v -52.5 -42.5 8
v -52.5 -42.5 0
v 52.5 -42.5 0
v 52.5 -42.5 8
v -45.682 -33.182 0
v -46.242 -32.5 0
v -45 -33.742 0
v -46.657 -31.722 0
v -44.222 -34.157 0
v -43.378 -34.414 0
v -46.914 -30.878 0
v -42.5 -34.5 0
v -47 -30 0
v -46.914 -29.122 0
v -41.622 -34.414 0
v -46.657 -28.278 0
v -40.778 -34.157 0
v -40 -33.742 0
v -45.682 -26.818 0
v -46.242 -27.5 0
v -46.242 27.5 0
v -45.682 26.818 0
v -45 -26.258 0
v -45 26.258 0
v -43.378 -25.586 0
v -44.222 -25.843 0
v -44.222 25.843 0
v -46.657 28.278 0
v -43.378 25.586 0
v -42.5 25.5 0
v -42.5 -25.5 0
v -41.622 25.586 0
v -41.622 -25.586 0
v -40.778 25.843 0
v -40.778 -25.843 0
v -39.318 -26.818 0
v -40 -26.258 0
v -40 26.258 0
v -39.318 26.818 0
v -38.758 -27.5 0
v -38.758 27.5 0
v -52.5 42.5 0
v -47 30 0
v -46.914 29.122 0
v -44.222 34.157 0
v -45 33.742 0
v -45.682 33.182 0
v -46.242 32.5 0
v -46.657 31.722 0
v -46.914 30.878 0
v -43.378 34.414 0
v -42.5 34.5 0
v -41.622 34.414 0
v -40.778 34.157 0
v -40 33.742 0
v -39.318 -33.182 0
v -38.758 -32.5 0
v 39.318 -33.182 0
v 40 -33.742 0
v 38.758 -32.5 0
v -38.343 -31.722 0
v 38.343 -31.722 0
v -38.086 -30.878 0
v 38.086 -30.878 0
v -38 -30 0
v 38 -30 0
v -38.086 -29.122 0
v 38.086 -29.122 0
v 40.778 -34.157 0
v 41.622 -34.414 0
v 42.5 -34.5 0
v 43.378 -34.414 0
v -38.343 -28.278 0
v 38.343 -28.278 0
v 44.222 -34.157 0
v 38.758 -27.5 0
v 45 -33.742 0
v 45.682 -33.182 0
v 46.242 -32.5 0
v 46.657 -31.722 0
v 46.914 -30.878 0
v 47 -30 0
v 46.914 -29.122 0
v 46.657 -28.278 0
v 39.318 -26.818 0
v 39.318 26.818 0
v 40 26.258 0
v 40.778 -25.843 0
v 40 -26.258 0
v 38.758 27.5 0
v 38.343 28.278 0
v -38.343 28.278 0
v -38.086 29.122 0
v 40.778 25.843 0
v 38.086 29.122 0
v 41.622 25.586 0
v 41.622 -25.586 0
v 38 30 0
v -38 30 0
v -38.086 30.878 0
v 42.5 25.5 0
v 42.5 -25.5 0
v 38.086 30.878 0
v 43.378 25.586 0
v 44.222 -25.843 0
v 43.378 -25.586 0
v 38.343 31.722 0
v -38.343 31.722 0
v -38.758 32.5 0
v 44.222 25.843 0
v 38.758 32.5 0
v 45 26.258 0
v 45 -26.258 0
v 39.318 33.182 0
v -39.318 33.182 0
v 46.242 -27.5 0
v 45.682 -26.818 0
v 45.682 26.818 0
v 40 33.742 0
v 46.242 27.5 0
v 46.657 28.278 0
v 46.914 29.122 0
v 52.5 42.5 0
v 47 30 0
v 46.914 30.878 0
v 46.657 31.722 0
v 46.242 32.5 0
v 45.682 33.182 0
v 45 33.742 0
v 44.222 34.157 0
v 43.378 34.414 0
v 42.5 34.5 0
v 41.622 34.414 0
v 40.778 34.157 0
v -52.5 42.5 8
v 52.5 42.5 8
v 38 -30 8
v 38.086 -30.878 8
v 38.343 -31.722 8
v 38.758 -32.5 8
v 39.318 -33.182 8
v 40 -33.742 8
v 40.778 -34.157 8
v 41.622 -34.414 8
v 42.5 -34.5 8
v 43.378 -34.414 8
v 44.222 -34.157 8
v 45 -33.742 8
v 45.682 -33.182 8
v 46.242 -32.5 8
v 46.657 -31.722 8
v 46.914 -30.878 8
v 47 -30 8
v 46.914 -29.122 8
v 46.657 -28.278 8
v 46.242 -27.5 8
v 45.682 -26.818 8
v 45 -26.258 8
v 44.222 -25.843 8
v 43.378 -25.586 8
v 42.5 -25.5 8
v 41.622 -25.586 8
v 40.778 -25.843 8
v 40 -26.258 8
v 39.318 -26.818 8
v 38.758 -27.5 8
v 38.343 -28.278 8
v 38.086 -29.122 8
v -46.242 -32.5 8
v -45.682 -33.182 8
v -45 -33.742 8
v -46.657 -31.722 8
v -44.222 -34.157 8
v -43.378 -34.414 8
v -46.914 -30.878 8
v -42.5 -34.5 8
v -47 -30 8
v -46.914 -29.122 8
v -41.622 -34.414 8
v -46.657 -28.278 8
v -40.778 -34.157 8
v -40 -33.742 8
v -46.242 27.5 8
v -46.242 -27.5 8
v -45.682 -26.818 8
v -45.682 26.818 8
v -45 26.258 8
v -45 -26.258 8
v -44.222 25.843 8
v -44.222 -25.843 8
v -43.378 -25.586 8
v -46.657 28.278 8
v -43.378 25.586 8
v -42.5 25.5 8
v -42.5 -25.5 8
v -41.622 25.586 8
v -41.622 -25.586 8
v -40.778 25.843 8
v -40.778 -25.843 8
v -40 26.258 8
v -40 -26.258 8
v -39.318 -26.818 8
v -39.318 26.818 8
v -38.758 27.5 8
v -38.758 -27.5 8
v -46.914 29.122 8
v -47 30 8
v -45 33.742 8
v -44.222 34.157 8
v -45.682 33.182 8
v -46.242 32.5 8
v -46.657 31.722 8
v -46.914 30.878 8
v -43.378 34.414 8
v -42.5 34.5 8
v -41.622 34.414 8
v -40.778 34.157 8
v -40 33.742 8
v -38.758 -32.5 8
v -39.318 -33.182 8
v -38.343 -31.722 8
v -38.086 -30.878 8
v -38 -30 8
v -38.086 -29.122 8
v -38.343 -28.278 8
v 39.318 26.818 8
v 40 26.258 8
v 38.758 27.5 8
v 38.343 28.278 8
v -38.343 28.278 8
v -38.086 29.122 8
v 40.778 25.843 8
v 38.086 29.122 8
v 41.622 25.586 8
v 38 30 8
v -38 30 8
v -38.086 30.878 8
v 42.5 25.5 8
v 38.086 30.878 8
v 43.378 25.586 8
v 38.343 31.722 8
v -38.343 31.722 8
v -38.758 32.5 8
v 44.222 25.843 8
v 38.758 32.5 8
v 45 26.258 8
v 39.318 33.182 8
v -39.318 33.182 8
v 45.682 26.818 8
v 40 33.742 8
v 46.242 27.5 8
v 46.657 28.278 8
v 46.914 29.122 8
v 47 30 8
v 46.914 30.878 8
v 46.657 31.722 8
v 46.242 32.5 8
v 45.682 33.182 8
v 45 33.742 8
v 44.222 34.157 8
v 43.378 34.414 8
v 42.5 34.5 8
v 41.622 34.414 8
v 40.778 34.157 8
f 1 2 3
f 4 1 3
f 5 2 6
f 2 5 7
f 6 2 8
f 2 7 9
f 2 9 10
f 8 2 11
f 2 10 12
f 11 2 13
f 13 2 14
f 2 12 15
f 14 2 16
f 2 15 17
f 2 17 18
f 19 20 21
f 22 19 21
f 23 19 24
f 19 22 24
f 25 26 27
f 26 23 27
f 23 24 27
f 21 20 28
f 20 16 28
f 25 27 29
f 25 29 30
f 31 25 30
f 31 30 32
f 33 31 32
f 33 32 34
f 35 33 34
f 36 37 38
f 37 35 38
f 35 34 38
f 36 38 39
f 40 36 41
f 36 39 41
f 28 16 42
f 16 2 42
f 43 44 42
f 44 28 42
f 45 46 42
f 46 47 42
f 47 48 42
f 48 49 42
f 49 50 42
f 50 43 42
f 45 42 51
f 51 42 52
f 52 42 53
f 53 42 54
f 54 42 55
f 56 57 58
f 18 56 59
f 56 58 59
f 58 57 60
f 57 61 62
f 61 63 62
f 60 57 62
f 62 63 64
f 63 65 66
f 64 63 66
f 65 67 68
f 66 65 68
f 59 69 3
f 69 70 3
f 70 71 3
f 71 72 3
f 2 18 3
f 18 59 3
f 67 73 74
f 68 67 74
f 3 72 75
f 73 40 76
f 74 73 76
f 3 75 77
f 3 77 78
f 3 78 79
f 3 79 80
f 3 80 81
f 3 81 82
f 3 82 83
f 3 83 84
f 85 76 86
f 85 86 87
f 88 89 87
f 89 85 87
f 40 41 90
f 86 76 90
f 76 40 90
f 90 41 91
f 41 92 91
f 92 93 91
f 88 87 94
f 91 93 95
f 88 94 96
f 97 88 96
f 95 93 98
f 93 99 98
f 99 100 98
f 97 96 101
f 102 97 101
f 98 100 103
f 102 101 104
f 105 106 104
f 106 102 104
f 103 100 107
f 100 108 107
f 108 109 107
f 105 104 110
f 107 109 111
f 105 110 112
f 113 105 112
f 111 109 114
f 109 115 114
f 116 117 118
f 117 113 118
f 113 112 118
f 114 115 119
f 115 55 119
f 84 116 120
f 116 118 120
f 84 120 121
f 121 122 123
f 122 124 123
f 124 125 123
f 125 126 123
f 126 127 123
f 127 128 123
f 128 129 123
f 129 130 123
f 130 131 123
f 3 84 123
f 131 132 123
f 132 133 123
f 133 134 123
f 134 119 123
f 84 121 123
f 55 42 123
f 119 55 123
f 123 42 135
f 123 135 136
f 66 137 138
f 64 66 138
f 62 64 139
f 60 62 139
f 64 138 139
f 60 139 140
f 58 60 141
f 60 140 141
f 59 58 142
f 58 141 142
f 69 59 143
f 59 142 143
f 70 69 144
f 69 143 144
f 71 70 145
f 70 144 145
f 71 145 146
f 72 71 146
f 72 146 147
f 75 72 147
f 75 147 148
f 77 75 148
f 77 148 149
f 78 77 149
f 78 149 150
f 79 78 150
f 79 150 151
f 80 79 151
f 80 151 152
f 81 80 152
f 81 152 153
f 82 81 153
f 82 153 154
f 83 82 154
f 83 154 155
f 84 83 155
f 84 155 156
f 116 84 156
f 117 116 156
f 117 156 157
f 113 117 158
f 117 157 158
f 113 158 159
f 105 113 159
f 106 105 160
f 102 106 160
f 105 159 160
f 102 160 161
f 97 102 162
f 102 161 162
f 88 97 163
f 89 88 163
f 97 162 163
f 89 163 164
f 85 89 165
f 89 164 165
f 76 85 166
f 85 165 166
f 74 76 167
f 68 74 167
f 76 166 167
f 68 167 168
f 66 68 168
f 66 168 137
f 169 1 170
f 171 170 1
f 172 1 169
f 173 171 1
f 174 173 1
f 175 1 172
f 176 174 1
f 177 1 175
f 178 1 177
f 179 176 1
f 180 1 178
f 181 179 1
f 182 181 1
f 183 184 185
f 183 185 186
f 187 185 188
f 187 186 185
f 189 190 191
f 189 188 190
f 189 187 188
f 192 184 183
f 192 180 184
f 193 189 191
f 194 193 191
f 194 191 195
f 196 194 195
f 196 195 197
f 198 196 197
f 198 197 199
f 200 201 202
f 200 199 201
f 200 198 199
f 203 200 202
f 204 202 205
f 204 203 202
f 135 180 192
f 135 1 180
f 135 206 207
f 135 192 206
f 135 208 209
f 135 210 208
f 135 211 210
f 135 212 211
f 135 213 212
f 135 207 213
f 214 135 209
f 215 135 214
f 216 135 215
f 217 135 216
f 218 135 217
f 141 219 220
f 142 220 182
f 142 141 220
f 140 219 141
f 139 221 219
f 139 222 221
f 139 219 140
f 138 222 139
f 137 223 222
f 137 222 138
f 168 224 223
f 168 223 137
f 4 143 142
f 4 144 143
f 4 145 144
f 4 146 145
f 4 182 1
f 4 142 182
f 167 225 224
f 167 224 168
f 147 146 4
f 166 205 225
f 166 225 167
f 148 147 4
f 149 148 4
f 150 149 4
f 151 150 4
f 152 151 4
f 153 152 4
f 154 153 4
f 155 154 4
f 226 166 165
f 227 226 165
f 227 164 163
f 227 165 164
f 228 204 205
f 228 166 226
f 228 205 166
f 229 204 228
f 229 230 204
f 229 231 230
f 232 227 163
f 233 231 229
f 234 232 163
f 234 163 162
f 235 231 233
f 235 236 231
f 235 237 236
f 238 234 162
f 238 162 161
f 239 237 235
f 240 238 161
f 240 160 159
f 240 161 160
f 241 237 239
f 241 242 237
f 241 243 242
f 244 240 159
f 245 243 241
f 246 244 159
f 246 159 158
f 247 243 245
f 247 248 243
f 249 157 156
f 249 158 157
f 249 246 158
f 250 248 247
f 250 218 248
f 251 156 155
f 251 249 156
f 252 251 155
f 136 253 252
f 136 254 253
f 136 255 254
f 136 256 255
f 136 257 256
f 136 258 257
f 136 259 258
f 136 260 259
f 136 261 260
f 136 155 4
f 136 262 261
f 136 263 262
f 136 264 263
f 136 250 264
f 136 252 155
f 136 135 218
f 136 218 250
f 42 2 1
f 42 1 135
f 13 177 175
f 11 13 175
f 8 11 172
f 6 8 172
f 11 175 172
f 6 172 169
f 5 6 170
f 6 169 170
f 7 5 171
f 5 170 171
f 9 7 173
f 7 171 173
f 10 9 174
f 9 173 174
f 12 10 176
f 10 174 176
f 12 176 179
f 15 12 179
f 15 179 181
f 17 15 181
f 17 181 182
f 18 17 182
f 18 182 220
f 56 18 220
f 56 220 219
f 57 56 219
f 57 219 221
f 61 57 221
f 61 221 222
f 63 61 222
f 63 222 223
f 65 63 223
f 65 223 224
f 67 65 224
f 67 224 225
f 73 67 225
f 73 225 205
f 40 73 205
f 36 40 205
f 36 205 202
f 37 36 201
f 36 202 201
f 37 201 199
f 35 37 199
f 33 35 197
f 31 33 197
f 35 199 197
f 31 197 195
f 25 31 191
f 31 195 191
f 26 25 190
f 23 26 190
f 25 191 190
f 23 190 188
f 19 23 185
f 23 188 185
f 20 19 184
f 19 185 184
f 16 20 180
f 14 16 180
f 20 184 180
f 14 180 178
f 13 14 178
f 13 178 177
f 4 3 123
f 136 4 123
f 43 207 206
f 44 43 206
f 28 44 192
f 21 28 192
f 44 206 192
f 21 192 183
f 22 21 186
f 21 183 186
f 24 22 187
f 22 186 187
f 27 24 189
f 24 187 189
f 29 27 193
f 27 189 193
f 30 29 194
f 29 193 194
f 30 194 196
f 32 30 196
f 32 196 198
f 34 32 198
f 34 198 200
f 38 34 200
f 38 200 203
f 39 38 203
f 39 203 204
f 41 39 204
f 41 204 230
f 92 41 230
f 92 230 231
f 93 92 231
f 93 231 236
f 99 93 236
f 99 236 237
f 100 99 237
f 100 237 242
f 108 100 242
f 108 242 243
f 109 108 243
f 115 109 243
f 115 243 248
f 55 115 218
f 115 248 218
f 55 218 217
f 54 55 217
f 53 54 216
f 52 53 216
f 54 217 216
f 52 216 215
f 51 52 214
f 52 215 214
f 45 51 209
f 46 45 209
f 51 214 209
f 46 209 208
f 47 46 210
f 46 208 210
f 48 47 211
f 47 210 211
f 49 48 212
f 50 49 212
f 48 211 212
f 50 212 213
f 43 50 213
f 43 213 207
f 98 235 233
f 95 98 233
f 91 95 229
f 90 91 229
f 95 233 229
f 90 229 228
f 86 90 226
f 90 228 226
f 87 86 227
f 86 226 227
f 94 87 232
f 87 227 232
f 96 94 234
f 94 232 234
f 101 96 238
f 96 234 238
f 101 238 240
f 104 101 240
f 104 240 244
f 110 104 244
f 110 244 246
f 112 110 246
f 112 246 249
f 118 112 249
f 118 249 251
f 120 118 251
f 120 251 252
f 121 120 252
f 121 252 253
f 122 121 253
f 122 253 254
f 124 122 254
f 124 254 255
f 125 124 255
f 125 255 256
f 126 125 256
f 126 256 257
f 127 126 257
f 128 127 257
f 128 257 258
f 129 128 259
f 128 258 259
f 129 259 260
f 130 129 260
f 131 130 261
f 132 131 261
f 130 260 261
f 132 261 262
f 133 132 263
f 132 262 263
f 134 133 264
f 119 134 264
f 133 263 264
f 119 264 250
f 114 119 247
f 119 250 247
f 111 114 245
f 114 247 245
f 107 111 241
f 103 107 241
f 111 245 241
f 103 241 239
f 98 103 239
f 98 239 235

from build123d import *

# Parameters (mm, degrees)
F0_W     = 105
F0_H     = 85
F0_R     = 4
F1_DEPTH = 8
F2_D     = 9
F2_DEPTH = 14
F2_TIP   = 2.7038727856


with BuildPart() as f1:
    # F0 (on Top) → F1 (new body)
    with BuildSketch(Plane.XY):
        Rectangle(F0_W, F0_H)
        with Locations((-42.5, -30)):
            Circle(F0_R, mode=Mode.SUBTRACT)
        with Locations((42.5, -30)):
            Circle(F0_R, mode=Mode.SUBTRACT)
        with Locations((-42.5, 30)):
            Circle(F0_R, mode=Mode.SUBTRACT)
        with Locations((42.5, 30)):
            Circle(F0_R, mode=Mode.SUBTRACT)
        with Locations((-42.5, 30)):
            Circle(F0_R)
        with Locations((42.5, 30)):
            Circle(F0_R)
        with Locations((42.5, -30)):
            Circle(F0_R)
        with Locations((-42.5, -30)):
            Circle(F0_R)
    extrude(amount=F1_DEPTH)

    # F2
    with Locations(Plane(origin=(0, 0, 0), x_dir=(1, 0, 0), z_dir=(0, 0, -1))):
        with Locations((-42.5, -30), (42.5, -30), (42.5, 30), (-42.5, 30)):
            Hole(F2_D / 2, depth=F2_DEPTH)
            with Locations((0, 0, -(F2_DEPTH + F2_TIP / 2))):  # 118° drill point
                Cone(0, F2_D / 2, F2_TIP, mode=Mode.SUBTRACT)


solid = f1.part
